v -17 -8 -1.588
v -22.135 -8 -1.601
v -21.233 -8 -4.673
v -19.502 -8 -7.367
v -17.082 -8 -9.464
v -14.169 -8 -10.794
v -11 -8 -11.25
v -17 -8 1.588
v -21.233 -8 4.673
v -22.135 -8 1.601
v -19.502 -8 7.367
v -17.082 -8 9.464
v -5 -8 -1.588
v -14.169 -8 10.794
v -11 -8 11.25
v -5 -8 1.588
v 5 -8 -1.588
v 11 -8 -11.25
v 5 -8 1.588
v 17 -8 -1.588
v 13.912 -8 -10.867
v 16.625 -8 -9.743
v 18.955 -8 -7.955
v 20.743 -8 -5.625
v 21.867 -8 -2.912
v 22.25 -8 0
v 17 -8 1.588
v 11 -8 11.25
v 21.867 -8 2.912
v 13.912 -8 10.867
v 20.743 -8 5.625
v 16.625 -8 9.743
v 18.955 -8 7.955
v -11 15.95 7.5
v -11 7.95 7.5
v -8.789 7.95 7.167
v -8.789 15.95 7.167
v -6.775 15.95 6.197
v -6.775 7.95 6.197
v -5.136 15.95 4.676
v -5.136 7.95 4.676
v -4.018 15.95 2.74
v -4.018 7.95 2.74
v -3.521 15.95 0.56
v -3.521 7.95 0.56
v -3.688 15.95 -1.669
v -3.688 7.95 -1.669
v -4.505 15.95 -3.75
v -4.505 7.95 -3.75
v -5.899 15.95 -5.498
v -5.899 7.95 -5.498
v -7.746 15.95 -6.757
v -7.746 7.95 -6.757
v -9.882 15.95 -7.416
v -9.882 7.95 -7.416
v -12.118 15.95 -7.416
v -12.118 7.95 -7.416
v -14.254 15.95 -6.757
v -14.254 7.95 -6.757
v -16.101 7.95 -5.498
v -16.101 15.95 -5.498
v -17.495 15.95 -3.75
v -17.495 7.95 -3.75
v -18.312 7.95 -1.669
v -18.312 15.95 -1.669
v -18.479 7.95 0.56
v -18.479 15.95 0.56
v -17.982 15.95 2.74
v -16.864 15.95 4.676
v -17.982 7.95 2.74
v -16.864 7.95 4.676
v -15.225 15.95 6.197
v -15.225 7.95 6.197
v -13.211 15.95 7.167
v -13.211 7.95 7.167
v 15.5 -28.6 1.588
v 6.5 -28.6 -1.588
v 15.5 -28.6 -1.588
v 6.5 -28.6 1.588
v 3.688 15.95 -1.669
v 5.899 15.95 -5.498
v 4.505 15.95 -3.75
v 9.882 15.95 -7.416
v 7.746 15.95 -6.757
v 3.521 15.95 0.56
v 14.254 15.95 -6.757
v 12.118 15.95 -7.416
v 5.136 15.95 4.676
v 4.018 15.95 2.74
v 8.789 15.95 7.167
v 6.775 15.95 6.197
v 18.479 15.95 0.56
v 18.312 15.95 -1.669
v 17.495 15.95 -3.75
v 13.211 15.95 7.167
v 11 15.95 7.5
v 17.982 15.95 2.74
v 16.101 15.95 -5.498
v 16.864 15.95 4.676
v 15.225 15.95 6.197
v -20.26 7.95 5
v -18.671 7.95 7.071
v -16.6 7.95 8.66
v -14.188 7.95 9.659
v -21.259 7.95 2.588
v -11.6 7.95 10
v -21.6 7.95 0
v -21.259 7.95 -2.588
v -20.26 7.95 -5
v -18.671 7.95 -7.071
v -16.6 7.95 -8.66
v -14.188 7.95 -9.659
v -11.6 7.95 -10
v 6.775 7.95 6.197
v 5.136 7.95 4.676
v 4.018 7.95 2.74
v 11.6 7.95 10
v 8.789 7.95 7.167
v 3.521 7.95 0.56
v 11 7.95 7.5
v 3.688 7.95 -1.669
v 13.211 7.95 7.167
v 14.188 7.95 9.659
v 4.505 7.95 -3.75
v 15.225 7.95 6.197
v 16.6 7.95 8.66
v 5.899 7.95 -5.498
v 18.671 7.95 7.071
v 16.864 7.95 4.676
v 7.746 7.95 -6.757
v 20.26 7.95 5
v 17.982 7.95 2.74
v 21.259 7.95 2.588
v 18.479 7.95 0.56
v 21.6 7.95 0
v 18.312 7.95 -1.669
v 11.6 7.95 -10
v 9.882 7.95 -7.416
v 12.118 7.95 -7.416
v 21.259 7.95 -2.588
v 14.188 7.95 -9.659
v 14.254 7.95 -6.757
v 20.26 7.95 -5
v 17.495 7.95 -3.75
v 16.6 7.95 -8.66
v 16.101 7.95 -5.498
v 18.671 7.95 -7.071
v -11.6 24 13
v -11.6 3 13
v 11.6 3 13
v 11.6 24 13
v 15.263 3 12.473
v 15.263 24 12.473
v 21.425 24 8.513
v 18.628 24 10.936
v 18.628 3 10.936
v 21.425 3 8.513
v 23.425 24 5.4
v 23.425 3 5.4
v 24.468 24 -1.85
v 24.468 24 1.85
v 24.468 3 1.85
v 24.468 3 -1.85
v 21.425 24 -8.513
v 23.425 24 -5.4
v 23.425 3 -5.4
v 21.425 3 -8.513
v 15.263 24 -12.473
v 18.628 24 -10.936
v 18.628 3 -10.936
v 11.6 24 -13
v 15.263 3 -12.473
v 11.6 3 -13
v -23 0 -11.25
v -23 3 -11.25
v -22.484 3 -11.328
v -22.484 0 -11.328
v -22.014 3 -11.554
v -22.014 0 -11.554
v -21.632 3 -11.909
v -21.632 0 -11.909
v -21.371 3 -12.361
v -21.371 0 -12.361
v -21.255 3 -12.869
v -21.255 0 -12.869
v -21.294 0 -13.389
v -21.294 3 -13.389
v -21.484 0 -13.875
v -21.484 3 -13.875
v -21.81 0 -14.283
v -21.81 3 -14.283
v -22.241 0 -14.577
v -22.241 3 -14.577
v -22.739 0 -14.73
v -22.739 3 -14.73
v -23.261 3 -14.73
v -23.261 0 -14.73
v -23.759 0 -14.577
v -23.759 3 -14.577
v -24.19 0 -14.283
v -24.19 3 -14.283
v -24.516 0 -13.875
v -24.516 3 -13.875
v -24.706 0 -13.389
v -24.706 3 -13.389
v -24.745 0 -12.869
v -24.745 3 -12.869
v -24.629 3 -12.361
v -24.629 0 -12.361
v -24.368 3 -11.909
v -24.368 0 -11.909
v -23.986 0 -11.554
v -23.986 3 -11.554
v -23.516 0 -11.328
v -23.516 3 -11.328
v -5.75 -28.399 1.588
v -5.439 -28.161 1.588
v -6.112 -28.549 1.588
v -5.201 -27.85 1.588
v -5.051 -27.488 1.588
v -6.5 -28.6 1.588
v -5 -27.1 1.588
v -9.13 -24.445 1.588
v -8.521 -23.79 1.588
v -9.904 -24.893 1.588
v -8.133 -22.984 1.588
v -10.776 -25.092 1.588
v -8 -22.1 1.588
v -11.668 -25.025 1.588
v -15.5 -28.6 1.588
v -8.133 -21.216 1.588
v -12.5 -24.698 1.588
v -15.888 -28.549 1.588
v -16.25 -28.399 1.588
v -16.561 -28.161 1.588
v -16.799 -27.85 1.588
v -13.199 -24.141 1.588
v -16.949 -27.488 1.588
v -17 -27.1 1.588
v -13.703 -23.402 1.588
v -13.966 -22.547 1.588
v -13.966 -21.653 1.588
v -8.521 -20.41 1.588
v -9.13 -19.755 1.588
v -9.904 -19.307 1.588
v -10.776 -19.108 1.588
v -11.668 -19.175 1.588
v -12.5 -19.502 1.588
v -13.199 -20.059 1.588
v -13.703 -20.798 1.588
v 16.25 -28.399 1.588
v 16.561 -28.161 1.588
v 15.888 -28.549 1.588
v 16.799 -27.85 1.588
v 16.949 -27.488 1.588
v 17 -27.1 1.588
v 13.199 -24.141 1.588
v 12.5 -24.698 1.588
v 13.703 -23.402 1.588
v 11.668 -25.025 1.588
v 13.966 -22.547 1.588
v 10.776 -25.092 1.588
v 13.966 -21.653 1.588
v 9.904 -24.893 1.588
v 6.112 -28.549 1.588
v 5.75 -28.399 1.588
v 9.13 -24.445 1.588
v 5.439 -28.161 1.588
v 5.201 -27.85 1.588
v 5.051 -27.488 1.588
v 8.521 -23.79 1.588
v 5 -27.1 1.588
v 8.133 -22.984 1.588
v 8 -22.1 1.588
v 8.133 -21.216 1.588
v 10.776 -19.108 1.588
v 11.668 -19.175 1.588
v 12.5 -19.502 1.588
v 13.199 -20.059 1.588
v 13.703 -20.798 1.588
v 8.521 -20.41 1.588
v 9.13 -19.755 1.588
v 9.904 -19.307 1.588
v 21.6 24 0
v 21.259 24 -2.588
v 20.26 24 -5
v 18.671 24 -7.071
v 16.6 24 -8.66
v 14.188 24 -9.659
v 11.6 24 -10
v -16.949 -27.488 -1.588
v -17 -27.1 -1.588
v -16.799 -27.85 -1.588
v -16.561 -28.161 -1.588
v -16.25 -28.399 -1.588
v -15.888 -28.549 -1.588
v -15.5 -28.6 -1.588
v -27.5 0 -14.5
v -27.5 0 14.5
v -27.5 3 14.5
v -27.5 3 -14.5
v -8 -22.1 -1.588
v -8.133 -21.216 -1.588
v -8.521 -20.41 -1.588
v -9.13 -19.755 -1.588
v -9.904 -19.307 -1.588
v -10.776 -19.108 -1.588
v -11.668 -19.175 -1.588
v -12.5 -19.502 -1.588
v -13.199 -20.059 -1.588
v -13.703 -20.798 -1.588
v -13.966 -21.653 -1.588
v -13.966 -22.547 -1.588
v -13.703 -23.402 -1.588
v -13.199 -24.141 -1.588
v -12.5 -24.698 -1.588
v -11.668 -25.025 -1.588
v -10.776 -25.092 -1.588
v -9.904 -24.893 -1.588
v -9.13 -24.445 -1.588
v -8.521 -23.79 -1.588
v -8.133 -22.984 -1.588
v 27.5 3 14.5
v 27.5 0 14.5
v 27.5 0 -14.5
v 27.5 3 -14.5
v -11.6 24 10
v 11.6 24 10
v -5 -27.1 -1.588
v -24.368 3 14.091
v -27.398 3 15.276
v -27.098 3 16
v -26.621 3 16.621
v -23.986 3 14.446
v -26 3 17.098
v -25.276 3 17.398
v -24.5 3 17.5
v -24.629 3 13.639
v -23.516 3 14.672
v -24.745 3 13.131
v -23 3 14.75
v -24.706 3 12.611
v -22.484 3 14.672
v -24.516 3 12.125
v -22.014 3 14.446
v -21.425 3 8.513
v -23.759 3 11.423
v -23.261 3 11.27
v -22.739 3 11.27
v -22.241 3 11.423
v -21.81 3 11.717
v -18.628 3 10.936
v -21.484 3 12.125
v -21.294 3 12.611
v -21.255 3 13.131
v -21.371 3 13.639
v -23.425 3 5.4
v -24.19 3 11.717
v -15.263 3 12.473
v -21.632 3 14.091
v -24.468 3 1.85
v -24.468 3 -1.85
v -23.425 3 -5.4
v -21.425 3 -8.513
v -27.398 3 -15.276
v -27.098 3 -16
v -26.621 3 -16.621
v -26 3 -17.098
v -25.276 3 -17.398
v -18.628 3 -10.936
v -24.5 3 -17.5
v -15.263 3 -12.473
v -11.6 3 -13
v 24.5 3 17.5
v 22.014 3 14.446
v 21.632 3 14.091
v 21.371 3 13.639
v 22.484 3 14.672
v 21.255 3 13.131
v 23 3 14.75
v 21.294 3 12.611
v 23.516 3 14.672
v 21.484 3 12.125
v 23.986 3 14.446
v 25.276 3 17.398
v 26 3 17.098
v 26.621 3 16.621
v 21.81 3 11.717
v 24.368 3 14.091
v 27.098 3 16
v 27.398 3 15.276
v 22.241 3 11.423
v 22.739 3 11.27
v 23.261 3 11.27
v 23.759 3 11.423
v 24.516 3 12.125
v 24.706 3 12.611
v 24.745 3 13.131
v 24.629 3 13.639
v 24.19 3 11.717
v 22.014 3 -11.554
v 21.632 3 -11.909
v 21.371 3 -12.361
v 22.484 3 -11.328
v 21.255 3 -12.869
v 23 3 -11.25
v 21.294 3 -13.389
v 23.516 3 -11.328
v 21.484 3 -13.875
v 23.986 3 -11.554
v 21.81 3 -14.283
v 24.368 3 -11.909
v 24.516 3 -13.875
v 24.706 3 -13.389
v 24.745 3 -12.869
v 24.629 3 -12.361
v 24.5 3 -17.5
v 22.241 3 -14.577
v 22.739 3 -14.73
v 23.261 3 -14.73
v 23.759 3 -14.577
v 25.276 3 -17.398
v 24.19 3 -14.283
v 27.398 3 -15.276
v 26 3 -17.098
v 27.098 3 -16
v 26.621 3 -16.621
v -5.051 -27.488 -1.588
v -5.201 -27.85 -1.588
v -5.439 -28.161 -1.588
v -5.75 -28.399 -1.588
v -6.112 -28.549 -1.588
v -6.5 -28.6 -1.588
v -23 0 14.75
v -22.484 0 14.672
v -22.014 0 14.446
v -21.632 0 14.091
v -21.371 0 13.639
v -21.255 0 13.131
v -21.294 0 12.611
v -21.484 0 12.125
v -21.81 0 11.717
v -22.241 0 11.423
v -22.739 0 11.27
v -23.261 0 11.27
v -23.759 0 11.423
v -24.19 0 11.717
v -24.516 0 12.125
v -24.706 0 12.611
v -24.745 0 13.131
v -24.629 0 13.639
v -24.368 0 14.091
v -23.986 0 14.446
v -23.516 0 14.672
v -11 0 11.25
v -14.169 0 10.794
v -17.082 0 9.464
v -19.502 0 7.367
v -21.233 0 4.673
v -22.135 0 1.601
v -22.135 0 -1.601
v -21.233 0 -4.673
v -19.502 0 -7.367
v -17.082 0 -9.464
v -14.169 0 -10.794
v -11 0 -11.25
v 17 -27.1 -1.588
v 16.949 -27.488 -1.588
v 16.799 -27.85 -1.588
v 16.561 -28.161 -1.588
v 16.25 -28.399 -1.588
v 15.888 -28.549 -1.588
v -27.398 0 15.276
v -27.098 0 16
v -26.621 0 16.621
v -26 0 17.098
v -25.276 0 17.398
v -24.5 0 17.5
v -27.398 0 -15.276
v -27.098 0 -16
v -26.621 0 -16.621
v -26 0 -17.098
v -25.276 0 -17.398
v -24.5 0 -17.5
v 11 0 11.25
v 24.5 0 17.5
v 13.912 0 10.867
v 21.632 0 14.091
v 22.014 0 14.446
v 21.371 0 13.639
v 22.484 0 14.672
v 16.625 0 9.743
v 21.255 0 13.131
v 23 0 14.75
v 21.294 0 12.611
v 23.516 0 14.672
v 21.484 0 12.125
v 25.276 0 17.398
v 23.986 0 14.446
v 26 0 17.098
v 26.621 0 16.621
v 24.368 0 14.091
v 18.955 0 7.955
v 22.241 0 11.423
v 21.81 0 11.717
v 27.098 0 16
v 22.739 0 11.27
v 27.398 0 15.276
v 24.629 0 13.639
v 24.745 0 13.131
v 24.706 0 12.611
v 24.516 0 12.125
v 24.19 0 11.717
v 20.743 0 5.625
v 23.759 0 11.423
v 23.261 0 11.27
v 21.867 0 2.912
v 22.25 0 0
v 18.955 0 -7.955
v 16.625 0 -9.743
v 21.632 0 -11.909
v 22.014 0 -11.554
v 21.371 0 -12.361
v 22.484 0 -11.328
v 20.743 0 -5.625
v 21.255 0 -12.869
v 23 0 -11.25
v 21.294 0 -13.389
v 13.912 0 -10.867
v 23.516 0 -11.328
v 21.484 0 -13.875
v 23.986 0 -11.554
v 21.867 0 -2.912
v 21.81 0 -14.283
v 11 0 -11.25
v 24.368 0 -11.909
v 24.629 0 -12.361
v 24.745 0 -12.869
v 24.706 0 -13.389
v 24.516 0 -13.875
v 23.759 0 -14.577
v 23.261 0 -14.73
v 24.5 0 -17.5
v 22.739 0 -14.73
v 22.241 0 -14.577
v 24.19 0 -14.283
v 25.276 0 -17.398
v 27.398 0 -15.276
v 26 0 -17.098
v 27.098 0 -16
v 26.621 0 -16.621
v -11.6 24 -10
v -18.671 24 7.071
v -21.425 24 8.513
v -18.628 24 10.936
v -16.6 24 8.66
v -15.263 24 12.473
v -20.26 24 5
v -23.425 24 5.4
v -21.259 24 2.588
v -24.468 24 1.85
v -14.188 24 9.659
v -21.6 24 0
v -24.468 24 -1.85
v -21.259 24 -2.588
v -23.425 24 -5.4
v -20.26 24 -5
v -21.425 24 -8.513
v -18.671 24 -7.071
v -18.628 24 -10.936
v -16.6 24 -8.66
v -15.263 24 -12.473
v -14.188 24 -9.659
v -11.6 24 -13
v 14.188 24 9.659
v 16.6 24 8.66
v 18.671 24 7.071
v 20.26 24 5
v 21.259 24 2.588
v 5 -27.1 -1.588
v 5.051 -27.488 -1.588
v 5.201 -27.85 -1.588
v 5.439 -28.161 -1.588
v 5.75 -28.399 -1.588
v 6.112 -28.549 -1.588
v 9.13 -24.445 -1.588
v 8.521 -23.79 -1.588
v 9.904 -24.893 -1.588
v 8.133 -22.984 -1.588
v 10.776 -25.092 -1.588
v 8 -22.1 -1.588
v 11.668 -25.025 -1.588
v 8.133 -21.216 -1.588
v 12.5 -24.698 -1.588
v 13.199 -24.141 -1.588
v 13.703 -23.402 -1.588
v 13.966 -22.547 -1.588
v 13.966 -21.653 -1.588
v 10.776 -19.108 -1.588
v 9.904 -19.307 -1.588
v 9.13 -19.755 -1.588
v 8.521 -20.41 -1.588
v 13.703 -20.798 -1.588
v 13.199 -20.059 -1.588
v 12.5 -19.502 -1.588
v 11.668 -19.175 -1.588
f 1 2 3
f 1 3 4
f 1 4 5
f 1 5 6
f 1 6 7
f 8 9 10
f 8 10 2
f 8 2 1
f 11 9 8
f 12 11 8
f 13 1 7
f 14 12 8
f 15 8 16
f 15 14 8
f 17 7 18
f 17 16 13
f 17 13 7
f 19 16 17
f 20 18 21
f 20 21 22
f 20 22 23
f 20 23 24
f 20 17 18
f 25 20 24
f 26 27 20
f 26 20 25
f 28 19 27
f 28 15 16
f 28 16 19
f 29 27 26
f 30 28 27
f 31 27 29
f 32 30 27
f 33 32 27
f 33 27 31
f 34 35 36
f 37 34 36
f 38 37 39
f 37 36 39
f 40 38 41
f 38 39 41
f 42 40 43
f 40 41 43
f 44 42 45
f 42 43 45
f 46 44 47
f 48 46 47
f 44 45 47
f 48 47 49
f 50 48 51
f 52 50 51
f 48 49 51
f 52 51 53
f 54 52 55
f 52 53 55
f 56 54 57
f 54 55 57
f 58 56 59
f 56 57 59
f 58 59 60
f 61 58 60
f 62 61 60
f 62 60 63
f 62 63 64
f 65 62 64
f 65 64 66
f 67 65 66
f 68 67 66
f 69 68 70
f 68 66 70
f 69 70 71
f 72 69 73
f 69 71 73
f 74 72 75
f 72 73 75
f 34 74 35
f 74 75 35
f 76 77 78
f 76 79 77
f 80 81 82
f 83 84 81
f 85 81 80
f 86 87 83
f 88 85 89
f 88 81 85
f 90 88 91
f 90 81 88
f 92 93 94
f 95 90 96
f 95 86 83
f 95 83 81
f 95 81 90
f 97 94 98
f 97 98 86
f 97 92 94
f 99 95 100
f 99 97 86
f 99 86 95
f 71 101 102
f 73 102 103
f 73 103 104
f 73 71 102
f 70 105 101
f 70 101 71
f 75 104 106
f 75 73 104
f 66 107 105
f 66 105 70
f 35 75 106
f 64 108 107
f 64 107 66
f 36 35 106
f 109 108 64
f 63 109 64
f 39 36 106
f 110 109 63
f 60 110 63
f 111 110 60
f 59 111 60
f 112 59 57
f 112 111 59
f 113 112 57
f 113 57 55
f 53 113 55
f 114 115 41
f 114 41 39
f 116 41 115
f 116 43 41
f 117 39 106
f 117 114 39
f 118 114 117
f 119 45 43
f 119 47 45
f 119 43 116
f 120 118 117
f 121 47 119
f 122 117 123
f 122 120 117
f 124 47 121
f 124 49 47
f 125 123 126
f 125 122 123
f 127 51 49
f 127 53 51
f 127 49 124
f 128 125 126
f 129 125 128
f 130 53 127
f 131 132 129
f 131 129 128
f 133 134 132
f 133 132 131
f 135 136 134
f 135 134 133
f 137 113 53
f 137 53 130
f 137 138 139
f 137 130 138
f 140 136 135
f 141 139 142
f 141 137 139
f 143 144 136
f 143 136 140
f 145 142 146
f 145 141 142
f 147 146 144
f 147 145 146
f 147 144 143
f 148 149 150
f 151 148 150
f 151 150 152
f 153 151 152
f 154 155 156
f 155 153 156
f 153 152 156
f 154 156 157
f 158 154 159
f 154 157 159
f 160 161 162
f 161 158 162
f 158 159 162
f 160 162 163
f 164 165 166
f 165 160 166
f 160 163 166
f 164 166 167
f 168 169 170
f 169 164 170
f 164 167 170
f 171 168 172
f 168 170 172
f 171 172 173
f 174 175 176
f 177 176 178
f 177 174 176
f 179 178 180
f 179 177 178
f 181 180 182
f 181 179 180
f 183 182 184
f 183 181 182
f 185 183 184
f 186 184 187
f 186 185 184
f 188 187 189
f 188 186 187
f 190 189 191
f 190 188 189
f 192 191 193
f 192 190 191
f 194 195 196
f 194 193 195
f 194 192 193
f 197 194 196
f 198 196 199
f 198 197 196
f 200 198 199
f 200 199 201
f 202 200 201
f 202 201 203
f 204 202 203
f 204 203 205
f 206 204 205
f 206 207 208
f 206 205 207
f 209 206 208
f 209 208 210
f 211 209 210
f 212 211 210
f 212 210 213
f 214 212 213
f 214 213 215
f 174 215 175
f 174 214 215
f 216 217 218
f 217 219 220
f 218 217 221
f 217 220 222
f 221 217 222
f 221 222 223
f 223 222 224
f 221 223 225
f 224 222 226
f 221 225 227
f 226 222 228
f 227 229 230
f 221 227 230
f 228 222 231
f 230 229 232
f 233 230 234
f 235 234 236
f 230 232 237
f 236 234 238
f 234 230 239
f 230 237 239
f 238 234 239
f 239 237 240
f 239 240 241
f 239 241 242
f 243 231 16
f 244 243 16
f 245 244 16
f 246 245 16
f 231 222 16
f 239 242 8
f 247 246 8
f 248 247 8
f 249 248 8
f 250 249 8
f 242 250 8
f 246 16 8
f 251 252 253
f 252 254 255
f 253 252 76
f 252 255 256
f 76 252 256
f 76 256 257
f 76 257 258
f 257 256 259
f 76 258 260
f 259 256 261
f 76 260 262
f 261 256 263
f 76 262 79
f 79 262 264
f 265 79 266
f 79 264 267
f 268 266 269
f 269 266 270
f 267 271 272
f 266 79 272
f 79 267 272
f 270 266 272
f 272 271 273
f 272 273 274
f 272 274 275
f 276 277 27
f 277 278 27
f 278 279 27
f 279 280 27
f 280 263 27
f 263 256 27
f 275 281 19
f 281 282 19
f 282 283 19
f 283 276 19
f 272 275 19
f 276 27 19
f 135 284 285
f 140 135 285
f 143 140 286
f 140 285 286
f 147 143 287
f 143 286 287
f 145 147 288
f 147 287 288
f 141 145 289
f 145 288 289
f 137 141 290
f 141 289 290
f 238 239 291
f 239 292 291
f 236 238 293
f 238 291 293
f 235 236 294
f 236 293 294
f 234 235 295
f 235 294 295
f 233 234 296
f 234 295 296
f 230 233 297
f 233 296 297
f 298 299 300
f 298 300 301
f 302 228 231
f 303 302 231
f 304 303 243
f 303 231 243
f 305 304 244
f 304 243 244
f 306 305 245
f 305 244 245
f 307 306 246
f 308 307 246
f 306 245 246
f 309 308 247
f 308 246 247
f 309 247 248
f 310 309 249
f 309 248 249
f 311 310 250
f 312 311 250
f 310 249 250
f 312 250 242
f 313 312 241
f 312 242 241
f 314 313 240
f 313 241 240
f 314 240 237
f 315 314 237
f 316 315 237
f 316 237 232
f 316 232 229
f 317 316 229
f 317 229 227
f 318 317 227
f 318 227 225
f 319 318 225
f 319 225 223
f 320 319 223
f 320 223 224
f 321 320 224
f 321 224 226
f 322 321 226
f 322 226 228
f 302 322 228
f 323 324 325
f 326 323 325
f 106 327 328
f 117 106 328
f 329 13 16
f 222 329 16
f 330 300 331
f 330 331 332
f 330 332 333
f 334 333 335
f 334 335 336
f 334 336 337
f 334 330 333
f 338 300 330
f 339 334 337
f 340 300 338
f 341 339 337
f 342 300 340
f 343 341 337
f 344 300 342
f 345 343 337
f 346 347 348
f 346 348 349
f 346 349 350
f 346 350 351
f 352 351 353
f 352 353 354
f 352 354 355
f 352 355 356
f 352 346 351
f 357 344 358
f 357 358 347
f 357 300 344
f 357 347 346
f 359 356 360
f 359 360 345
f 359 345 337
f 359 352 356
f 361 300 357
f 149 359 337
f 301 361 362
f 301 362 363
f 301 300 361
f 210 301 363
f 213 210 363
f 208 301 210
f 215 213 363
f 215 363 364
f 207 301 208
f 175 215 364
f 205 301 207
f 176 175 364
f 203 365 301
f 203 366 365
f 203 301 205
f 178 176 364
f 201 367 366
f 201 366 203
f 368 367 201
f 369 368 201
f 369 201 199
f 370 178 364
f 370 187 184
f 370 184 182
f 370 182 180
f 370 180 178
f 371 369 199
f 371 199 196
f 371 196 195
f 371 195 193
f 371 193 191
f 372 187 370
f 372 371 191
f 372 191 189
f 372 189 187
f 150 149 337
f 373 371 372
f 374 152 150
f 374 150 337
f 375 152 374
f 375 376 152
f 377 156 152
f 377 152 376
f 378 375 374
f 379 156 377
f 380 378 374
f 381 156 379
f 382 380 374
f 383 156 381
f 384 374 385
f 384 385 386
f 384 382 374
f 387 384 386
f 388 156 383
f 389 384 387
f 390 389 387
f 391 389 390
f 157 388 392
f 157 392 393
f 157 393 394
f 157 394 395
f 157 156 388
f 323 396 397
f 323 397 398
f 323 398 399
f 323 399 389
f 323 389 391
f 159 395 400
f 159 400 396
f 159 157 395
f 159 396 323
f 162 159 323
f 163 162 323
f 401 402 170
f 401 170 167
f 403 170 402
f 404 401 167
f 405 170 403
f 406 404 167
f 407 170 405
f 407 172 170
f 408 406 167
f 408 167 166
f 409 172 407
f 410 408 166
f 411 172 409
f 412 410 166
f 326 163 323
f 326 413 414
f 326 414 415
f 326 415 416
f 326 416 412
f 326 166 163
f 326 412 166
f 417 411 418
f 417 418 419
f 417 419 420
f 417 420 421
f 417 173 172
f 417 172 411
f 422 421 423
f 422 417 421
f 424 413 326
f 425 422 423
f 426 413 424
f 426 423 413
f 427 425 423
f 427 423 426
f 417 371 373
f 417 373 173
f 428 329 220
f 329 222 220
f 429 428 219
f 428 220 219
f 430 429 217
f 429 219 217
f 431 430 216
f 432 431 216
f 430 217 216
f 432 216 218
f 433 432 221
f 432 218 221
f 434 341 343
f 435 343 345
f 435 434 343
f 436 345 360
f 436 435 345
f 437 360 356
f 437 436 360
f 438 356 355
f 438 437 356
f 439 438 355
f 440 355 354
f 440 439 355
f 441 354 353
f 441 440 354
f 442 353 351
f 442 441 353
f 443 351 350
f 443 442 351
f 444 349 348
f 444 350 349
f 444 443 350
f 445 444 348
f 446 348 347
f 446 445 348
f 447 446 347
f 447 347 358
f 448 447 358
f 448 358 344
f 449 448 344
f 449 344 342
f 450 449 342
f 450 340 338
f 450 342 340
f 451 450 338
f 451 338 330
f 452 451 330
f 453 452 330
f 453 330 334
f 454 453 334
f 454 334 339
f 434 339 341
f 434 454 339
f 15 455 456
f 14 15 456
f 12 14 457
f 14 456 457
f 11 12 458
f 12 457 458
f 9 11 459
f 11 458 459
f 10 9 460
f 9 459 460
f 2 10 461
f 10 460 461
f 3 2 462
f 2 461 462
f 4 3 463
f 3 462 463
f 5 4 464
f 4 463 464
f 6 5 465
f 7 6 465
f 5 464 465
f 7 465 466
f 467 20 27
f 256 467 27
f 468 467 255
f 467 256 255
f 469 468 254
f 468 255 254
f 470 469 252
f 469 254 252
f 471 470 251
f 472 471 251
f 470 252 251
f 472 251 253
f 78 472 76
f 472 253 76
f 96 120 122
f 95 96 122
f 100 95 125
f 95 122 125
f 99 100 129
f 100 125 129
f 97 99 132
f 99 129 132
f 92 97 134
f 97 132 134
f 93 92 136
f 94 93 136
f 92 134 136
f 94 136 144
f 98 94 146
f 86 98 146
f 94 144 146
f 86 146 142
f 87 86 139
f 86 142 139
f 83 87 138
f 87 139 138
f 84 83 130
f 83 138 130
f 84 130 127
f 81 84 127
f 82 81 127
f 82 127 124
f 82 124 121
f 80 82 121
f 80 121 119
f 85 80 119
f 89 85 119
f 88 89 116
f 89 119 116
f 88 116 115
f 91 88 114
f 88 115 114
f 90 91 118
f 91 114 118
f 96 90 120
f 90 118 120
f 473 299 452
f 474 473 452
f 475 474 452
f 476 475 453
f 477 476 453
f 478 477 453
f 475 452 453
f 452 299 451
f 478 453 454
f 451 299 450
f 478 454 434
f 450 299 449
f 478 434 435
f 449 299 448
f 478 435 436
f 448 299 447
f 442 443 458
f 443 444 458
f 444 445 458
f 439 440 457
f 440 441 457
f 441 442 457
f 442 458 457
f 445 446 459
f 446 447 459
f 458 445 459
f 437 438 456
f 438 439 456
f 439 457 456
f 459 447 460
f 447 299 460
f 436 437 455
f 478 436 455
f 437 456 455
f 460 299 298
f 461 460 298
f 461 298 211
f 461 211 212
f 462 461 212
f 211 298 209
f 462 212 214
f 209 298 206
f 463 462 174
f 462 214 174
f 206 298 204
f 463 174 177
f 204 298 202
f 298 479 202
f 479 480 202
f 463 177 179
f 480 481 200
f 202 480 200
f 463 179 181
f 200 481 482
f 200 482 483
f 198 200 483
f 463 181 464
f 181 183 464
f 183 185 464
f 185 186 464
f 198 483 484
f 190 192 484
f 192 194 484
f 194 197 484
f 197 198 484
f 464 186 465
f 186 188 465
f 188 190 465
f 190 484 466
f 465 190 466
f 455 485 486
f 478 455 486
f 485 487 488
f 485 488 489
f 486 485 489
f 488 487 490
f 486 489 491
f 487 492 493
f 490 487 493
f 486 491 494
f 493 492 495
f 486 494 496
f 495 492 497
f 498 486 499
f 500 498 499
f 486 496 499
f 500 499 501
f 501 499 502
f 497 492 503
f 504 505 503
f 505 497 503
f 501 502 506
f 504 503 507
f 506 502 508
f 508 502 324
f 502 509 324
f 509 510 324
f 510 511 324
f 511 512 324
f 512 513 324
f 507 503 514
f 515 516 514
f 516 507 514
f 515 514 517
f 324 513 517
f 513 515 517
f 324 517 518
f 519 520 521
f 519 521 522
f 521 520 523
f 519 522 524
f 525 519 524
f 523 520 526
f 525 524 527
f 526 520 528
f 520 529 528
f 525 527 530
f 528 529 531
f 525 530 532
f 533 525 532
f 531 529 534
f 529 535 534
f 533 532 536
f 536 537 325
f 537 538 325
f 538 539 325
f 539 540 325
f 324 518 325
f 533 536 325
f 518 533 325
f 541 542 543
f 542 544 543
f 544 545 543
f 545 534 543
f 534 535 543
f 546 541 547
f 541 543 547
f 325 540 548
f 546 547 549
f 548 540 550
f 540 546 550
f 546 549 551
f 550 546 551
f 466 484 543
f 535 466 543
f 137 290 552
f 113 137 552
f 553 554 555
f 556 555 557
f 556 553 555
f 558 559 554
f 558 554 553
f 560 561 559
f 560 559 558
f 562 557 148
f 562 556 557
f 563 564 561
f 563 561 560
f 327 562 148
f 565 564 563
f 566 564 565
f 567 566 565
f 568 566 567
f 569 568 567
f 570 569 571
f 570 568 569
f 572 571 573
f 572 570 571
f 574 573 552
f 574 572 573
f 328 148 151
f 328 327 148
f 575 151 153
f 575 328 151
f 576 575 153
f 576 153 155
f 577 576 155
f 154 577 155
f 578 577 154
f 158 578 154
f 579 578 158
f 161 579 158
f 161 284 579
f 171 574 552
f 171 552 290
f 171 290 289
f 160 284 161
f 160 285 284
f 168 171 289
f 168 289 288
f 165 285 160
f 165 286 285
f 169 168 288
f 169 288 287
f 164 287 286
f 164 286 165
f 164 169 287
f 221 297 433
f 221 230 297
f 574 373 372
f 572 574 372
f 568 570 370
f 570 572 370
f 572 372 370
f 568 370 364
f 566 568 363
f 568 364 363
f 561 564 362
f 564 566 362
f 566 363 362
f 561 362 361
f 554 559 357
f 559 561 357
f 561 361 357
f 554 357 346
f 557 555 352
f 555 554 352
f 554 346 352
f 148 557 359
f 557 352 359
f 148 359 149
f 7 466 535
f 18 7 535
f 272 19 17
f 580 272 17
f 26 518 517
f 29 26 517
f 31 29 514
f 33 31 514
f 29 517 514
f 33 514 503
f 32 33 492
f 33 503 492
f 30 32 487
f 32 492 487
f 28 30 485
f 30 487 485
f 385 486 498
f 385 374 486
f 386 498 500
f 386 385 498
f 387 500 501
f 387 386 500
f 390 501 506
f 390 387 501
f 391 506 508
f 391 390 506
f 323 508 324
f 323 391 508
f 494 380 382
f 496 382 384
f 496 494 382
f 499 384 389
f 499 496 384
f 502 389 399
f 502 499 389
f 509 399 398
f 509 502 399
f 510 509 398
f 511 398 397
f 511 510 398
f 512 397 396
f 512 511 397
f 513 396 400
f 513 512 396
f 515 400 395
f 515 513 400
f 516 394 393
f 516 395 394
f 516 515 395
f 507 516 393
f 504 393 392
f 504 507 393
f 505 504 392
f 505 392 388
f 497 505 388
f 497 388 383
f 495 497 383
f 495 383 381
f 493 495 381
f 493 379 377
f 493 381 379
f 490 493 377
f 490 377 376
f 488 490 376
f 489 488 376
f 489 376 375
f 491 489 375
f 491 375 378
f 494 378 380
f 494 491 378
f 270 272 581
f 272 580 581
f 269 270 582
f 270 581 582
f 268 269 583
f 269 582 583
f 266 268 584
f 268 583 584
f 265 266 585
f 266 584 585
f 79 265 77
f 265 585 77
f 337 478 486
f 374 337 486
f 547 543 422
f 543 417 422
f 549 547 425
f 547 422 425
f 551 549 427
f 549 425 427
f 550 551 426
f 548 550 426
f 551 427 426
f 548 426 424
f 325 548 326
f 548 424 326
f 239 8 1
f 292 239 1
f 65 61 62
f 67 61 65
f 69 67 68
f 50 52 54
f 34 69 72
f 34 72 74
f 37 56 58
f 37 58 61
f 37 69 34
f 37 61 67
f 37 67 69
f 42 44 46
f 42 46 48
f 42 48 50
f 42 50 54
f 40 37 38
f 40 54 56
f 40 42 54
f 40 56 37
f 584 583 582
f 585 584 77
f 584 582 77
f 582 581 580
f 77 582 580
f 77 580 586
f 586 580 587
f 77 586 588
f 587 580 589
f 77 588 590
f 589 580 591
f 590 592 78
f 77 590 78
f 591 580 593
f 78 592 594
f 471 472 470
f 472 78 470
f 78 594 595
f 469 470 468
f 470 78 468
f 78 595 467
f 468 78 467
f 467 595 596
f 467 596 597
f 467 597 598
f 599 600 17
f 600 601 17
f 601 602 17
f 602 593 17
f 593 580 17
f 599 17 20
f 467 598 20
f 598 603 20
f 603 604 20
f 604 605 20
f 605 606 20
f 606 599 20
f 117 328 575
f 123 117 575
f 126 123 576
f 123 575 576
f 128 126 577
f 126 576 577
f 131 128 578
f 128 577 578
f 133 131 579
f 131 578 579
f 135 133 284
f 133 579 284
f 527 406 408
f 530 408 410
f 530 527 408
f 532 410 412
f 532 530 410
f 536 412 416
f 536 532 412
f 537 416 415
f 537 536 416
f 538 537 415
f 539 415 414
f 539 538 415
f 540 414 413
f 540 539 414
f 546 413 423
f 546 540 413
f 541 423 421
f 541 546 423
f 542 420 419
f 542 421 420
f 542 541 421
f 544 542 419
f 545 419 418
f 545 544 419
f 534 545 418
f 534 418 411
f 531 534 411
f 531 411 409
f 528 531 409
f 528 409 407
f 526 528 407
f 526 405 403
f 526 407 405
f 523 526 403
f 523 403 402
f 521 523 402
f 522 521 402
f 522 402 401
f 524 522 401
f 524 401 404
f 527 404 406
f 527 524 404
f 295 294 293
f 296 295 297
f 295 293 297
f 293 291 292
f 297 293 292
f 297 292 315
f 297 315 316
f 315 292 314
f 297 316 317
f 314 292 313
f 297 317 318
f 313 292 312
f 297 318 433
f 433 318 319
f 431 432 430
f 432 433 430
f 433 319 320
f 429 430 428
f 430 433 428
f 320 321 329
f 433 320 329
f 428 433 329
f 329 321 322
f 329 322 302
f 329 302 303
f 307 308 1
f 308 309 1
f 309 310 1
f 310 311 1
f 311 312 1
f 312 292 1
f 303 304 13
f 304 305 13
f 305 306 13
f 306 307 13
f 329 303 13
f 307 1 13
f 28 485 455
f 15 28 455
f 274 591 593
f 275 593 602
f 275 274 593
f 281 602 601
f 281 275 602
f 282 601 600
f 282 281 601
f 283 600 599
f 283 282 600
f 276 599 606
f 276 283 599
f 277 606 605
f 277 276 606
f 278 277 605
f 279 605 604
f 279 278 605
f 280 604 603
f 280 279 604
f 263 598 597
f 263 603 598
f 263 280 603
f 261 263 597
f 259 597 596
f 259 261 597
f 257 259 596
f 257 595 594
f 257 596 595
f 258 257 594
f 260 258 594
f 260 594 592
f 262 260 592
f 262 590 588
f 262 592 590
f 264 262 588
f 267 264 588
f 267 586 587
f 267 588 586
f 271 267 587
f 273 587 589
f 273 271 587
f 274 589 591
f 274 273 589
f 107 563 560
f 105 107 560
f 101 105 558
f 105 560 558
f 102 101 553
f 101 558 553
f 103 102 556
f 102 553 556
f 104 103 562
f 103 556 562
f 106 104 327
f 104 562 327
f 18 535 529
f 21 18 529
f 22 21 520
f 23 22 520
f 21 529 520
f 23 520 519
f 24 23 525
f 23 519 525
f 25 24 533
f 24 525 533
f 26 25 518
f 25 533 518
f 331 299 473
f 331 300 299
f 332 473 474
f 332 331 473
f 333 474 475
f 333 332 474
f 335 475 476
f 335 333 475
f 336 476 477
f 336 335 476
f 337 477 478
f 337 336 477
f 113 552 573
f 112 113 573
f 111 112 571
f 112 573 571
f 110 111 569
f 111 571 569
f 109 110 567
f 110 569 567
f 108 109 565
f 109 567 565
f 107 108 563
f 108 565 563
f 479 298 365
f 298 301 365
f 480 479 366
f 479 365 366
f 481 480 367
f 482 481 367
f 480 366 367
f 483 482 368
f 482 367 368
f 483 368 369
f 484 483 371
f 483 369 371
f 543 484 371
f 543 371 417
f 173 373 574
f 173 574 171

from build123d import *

# Parameters (mm, degrees)
SKETCH1_W           = 55
SKETCH1_H           = 35
SKETCH1_R           = 1.75
BOSS_EXTRUDE1_DEPTH = 3
FILLET1_R           = 3
SKETCH2_W           = 49.2
SKETCH2_H           = 26
BOSS_EXTRUDE2_DEPTH = 21
FILLET2_R           = 13
BOSS_EXTRUDE3_DEPTH = 28.6
SKETCH4_R           = 3
CUT_EXTRUDE1_DEPTH  = 45.02888434
CUT_EXTRUDE2_DEPTH  = 16.05
SKETCH6_R           = 11.25
BOSS_EXTRUDE4_DEPTH = 8
SKETCH7_R           = 7.5
BOSS_EXTRUDE5_DEPTH = 8
FILLET3_R           = 1.5


with BuildPart() as part:
    # Sketch1 → Boss-Extrude1 (new body)
    with BuildSketch(Plane(origin=(0, 0, 0), x_dir=(1, 0, 0), z_dir=(0, 1, 0))):
        Rectangle(SKETCH1_W, SKETCH1_H)
        with Locations(Location((-23, 13, 0), (0, 0, 270))):
            Circle(SKETCH1_R, mode=Mode.SUBTRACT)
        with Locations(Location((-23, -13, 0), (0, 0, 270))):
            Circle(SKETCH1_R, mode=Mode.SUBTRACT)
        with Locations(Location((23, -13, 0), (0, 0, 270))):
            Circle(SKETCH1_R, mode=Mode.SUBTRACT)
        with Locations(Location((23, 13, 0), (0, 0, 270))):
            Circle(SKETCH1_R, mode=Mode.SUBTRACT)
    extrude(amount=BOSS_EXTRUDE1_DEPTH)

    # Fillet1
    fillet1_edges = [part.edges().sort_by_distance(p)[0] for p in [
        (27.5, 1.5, 17.5),
        (-27.5, 1.5, 17.5),
        (-27.5, 1.5, -17.5),
        (27.5, 1.5, -17.5),
    ]]
    fillet(fillet1_edges, radius=FILLET1_R)

    # Sketch2 → Boss-Extrude2 (add)
    with BuildSketch(Plane(origin=(0, 3, 0), x_dir=(1, 0, 0), z_dir=(0, 1, 0))):
        Rectangle(SKETCH2_W, SKETCH2_H)
    extrude(amount=BOSS_EXTRUDE2_DEPTH)

    # Fillet2
    # the kernel refuses this fillet: 13 mm, written as the material it takes off along each edge
    with BuildSketch(Plane(origin=(-24.6, 3, 13), x_dir=(1, 0, 0), z_dir=(0, 1, 0)), Plane(origin=(24.6, 3, -13), x_dir=(-1, 0, 0), z_dir=(0, 1, 0)), Plane(origin=(24.6, 3, 13), x_dir=(0, 0, -1), z_dir=(0, 1, 0))) as fillet2_piece_1:
        with BuildLine():
            CenterArc((FILLET2_R, FILLET2_R), FILLET2_R, 180, 90)
            Line((0, FILLET2_R), (0, 0))
            Line((0, 0), (FILLET2_R, 0))
        make_face()
    extrude(amount=53.5, mode=Mode.SUBTRACT)
    with BuildSketch(Plane(origin=(-24.6, 3, -13), x_dir=(1, 0, 0), z_dir=(0, 1, 0))) as fillet2_piece_2:
        with BuildLine():
            CenterArc((FILLET2_R, -FILLET2_R), FILLET2_R, 90, 90)
            Line((0, -FILLET2_R), (0, 0))
            Line((0, 0), (FILLET2_R, 0))
        make_face()
    extrude(amount=53.5, mode=Mode.SUBTRACT)

    # Sketch3 → Boss-Extrude3 (add)
    with BuildSketch(Plane.XZ):
        Polygon((-11, 0), (-17, 0), (-17, -1.5875), (-5, -1.5875), (-5, 0), align=None)
        Polygon((-17, 1.5875), (-17, 0), (-11, 0), (-5, 0), (-5, 1.5875), align=None)
        Polygon((5, 1.5875), (5, 0), (11, 0), (17, 0), (17, 1.5875), align=None)
        Polygon((11, 0), (5, 0), (5, -1.5875), (17, -1.5875), (17, 0), align=None)
    extrude(amount=BOSS_EXTRUDE3_DEPTH)

    # Sketch4 → Cut-Extrude1 (cut, through all)
    with BuildSketch(Plane.XY.offset(1.5875)):
        with Locations((-11, -22.1)):
            Circle(SKETCH4_R)
    cut_extrude1 = extrude(amount=-CUT_EXTRUDE1_DEPTH, mode=Mode.SUBTRACT)

    # Mirror1: Cut-Extrude1 across plane
    add(cut_extrude1.mirror(Plane(origin=(0, 0, 0), x_dir=(0, 0, 1), z_dir=(1, 0, 0))), mode=Mode.SUBTRACT)

    # Sketch5 → Cut-Extrude2 (cut)
    with BuildSketch(Plane(origin=(0, 24, 0), x_dir=(1, 0, 0), z_dir=(0, 1, 0))):
        with BuildLine():
            Line((-11.6, -10), (11.6, -10))
            ThreePointArc((11.6, -10), (18.671067812, -7.071067812), (21.6, 0))
            ThreePointArc((21.6, 0), (18.671067812, 7.071067812), (11.6, 10))
            Line((11.6, 10), (-11.6, 10))
            ThreePointArc((-11.6, 10), (-18.671067812, 7.071067812), (-21.6, 0))
            ThreePointArc((-21.6, 0), (-18.671067812, -7.071067812), (-11.6, -10))
        make_face()
    extrude(amount=-CUT_EXTRUDE2_DEPTH, mode=Mode.SUBTRACT)

    # Sketch6 → Boss-Extrude4 (add)
    with BuildSketch(Plane.XZ):
        with BuildLine():
            Line((-11, 1.5875), (-11, 11.25))
            ThreePointArc((-11, 11.25), (-22.25, 0), (-11, -11.25))
            Line((-11, -11.25), (-11, -1.5875))
            Line((-11, -1.5875), (-17, -1.5875))
            Line((-17, -1.5875), (-17, 1.5875))
            Line((-17, 1.5875), (-11, 1.5875))
        make_face()
        with BuildLine():
            ThreePointArc((0, 2.358495283), (-3.927891825, 8.749159158), (-11, 11.25))
            Line((-11, 11.25), (-11, 1.5875))
            Line((-11, 1.5875), (-5, 1.5875))
            Line((-5, 1.5875), (-5, -1.5875))
            Line((-5, -1.5875), (-11, -1.5875))
            Line((-11, -1.5875), (-11, -11.25))
            ThreePointArc((-11, -11.25), (-3.927891825, -8.749159158), (0, -2.358495283))
            ThreePointArc((0, -2.358495283), (-0.25, 0), (0, 2.358495283))
        make_face()
        with BuildLine():
            Line((11, 1.5875), (11, 11.25))
            ThreePointArc((11, 11.25), (3.927891825, 8.749159158), (0, 2.358495283))
            ThreePointArc((0, 2.358495283), (0.187325418, 1.185854123), (0.25, 0))
            ThreePointArc((0.25, 0), (0.187325418, -1.185854123), (0, -2.358495283))
            ThreePointArc((0, -2.358495283), (3.927891825, -8.749159158), (11, -11.25))
            Line((11, -11.25), (11, -1.5875))
            Line((11, -1.5875), (5, -1.5875))
            Line((5, -1.5875), (5, 1.5875))
            Line((5, 1.5875), (11, 1.5875))
        make_face()
        with BuildLine():
            ThreePointArc((22.25, 0), (18.954951288, 7.954951288), (11, 11.25))
            Line((11, 11.25), (11, 1.5875))
            Line((11, 1.5875), (17, 1.5875))
            Line((17, 1.5875), (17, -1.5875))
            Line((17, -1.5875), (11, -1.5875))
            Line((11, -1.5875), (11, -11.25))
            ThreePointArc((11, -11.25), (18.954951288, -7.954951288), (22.25, 0))
        make_face()
        with BuildLine():
            ThreePointArc((0, 2.358495283), (3.927891825, 8.749159158), (11, 11.25))
            Line((11, 11.25), (-11, 11.25))
            ThreePointArc((-11, 11.25), (-3.927891825, 8.749159158), (0, 2.358495283))
        make_face()
        with BuildLine():
            ThreePointArc((0, -2.358495283), (-3.927891825, -8.749159158), (-11, -11.25))
            Line((-11, -11.25), (11, -11.25))
            ThreePointArc((11, -11.25), (3.927891825, -8.749159158), (0, -2.358495283))
        make_face()
        with Locations((11, 0)):
            Circle(SKETCH6_R)
        with Locations((-11, 0)):
            Circle(SKETCH6_R)
    extrude(amount=BOSS_EXTRUDE4_DEPTH)

    # Sketch7 → Boss-Extrude5 (add)
    with BuildSketch(Plane(origin=(0, 7.95, 0), x_dir=(1, 0, 0), z_dir=(0, 1, 0))):
        with Locations(Location((-11, 0, 0), (0, 0, 270))):
            Circle(SKETCH7_R)
        with Locations(Location((11, 0, 0), (0, 0, 270))):
            Circle(SKETCH7_R)
    extrude(amount=BOSS_EXTRUDE5_DEPTH)

    # Fillet3
    fillet3_edges = [part.edges().sort_by_distance(p)[0] for p in [
        (-5, -28.6, 0),
        (-17, -28.6, 0),
        (17, -28.6, 0),
        (5, -28.6, 0),
    ]]
    fillet(fillet3_edges, radius=FILLET3_R)


solid = part.part
